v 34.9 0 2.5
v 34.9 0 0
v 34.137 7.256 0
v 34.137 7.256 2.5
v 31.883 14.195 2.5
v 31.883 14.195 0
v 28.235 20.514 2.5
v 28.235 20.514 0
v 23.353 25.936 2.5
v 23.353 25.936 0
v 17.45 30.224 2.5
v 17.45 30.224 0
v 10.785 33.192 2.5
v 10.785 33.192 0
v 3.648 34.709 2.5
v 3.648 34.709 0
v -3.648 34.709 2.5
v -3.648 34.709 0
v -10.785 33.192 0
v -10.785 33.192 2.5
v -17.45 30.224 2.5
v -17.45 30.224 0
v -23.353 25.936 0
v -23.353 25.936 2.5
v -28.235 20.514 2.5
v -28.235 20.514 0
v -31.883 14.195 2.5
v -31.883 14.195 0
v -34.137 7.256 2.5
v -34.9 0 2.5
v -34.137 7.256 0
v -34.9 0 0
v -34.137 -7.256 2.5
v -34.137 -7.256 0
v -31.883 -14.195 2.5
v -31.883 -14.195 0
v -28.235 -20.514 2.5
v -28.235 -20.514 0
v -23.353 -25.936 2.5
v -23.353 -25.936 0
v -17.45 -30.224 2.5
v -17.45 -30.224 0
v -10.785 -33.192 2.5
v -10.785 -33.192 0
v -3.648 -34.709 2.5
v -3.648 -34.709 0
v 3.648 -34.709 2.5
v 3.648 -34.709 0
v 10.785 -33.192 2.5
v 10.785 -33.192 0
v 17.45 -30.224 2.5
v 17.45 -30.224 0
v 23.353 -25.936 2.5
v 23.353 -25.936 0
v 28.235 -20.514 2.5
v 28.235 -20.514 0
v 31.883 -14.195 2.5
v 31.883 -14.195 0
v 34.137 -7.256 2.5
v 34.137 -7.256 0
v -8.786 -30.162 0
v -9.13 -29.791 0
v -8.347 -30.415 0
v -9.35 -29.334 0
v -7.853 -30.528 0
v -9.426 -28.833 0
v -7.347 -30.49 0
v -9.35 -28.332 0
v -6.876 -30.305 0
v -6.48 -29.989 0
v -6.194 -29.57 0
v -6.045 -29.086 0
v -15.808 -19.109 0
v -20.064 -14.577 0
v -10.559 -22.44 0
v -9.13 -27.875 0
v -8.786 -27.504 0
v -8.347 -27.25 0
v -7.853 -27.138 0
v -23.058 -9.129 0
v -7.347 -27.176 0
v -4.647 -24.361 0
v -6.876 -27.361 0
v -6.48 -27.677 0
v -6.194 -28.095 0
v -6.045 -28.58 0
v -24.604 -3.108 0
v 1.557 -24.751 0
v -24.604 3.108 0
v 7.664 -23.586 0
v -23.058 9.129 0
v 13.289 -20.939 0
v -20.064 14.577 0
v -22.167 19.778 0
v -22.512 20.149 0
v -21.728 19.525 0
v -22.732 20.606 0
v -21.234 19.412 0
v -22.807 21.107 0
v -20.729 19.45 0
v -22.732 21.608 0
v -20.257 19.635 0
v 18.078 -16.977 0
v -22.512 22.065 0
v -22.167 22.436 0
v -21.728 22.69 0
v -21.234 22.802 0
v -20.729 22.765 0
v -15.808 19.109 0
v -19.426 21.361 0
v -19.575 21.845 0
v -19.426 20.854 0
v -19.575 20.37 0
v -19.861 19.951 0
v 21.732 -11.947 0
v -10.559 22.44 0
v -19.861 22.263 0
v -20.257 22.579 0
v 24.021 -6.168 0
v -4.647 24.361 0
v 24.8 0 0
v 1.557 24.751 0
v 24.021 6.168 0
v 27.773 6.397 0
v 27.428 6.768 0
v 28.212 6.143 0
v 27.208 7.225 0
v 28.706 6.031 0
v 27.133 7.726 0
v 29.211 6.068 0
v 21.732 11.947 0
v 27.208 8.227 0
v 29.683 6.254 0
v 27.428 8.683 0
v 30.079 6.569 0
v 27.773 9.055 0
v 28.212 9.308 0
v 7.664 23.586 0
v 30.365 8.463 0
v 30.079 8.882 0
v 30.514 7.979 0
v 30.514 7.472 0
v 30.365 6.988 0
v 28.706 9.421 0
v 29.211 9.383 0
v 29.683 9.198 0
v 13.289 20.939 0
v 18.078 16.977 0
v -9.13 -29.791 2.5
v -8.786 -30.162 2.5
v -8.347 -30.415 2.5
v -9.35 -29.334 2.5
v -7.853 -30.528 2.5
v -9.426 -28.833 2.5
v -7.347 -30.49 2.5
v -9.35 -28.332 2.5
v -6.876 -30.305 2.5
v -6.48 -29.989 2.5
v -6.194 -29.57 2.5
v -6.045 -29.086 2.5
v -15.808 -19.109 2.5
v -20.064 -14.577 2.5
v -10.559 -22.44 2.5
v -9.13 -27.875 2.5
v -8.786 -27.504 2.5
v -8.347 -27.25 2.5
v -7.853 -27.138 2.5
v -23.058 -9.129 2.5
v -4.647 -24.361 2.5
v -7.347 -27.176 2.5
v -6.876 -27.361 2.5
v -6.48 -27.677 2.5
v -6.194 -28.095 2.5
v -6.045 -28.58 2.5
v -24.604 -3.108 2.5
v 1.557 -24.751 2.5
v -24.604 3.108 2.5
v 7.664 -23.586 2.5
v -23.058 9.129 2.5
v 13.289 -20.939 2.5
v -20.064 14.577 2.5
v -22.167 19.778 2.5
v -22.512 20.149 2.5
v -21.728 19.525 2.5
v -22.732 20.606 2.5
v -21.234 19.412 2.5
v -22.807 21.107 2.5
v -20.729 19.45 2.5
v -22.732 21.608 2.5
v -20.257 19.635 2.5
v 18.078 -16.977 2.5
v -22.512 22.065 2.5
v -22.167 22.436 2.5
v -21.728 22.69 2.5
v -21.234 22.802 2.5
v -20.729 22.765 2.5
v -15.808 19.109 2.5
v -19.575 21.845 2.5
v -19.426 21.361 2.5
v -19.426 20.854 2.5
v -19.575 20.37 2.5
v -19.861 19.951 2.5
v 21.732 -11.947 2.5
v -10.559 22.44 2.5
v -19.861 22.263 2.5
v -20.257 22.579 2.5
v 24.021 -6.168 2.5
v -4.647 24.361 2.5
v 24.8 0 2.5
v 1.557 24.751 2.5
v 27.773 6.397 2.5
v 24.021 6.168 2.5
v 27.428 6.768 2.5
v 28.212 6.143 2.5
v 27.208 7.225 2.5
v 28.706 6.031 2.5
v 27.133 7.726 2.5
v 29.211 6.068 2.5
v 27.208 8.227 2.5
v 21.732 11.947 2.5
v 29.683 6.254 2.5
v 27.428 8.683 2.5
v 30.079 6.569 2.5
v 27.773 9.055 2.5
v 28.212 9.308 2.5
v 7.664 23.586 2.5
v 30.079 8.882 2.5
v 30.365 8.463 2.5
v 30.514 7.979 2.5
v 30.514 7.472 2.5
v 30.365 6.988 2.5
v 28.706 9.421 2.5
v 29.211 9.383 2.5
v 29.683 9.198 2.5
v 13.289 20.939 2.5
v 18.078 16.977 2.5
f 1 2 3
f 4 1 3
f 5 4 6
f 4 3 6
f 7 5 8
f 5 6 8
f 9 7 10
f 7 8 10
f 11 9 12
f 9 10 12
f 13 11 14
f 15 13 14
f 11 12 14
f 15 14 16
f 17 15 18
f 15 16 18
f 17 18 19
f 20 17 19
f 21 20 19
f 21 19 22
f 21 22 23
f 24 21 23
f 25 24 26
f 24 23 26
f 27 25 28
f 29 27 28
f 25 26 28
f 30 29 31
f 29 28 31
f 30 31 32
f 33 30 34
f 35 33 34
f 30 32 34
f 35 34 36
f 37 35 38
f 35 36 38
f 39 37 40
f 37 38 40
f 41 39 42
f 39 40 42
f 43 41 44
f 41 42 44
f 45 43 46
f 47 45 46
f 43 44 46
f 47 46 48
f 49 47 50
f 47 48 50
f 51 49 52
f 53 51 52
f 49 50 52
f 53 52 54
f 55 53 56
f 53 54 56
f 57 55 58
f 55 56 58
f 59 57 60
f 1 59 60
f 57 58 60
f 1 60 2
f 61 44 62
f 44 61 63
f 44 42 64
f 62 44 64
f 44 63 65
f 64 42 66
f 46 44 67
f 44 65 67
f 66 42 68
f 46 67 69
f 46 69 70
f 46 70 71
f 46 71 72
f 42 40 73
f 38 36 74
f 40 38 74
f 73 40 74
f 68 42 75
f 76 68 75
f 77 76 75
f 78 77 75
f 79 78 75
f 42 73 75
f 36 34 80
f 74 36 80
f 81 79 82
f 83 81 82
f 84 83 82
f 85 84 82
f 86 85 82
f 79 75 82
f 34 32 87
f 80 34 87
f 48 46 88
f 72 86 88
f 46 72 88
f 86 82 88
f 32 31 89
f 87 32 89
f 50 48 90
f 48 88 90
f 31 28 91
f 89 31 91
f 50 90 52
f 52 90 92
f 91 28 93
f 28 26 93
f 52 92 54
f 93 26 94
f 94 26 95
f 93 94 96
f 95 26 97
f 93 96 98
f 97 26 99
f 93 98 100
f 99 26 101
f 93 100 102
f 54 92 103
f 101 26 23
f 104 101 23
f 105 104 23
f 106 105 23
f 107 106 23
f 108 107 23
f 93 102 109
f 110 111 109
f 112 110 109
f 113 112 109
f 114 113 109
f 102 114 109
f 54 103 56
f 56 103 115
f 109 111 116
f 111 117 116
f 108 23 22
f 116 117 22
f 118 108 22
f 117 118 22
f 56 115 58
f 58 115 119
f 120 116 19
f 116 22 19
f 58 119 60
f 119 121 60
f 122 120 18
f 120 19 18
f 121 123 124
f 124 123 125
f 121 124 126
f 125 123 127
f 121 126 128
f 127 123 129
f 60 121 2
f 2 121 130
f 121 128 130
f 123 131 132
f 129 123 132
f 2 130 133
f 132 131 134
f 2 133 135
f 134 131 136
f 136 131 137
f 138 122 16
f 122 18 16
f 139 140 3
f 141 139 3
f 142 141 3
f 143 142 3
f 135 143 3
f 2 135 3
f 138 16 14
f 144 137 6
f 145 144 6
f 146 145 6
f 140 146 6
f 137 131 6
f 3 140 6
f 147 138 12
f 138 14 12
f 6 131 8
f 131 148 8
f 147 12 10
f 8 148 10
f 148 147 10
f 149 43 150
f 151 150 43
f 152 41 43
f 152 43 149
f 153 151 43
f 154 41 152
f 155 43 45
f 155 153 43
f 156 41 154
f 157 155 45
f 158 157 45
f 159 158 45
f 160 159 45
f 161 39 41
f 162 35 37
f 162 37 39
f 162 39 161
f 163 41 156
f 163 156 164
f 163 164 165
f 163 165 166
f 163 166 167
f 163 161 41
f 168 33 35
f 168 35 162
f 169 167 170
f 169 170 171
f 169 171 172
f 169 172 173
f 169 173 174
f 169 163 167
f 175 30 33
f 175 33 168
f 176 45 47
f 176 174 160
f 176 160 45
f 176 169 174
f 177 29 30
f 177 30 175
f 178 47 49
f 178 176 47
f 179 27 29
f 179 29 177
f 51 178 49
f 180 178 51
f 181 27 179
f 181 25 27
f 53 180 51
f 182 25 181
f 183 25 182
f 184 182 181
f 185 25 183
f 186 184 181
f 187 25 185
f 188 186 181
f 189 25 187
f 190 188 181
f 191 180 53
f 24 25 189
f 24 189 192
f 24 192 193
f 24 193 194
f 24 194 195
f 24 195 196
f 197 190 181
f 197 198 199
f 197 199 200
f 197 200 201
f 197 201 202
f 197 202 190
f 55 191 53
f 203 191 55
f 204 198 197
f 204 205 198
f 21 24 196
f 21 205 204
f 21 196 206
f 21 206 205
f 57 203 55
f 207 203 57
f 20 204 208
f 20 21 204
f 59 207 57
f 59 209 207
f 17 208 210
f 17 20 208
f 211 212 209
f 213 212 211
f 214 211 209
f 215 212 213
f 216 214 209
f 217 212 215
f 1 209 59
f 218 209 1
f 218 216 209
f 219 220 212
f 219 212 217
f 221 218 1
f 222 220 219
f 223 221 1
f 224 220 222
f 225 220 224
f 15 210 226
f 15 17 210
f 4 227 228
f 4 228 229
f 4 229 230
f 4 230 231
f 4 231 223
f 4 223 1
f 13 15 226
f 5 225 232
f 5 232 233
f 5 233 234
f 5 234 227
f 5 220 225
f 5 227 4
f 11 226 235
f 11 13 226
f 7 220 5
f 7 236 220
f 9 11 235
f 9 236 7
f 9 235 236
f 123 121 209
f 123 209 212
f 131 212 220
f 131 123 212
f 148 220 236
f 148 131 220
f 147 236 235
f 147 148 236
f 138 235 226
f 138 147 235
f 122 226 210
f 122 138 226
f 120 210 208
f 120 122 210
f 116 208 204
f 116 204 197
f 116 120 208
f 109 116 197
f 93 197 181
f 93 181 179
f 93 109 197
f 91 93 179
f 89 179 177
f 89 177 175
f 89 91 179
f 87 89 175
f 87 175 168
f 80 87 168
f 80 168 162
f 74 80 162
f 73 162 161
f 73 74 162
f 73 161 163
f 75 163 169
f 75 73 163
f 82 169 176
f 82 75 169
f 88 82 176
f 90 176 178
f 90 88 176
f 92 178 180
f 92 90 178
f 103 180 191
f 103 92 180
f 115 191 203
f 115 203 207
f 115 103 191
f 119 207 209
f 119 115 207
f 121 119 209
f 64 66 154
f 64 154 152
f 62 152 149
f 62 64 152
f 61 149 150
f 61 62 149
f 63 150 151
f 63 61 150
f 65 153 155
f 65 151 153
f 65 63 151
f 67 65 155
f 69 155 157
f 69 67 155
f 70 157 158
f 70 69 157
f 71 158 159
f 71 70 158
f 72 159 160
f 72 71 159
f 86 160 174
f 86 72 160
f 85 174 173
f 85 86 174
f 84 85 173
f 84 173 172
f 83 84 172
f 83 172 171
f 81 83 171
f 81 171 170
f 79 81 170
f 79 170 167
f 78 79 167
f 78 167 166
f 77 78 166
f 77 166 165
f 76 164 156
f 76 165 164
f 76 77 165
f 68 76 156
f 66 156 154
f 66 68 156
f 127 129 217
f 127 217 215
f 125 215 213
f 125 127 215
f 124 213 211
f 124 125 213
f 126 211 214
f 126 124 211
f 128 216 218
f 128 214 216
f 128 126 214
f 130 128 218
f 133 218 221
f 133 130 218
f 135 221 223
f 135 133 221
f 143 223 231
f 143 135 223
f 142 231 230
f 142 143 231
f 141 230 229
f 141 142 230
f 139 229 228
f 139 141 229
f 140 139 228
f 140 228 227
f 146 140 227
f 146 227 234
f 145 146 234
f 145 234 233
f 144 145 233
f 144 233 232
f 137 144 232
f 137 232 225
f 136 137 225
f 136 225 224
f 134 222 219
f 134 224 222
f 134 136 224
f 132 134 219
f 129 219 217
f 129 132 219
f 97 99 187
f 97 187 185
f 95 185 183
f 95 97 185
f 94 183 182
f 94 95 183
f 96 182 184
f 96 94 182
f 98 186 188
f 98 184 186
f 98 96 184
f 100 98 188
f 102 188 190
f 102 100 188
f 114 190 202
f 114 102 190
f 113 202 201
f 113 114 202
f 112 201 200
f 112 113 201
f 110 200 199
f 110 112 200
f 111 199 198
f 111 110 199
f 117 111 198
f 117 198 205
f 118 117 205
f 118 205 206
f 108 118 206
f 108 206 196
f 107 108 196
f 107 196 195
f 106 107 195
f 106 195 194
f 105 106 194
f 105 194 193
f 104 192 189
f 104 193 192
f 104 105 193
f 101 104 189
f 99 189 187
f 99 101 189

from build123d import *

# Parameters (mm, degrees)
S01_TPU_BEAD_AND_BEARING_OUTER_RACE_KE_R       = 34.9
S01_TPU_BEAD_AND_BEARING_OUTER_RACE_KE_R_2     = 24.8
F_01_TPU_BEAD_AND_BEARING_OUTER_RACE_KEE_DEPTH = 2.5
F_02_START                                     = -0.1
S02_FLANGE_SCREW_CLEARANCE_R                   = 1.7
F_02_FLANGE_SCREW_CLEARANCE_DEPTH              = 2.7


with BuildPart() as part:
    # S01 - TPU bead and bearing outer-race keeper → 01 - TPU bead and bearing outer-race keeper (new body)
    with BuildSketch(Plane.XY):
        Circle(S01_TPU_BEAD_AND_BEARING_OUTER_RACE_KE_R)
        Circle(S01_TPU_BEAD_AND_BEARING_OUTER_RACE_KE_R_2, mode=Mode.SUBTRACT)
    extrude(amount=F_01_TPU_BEAD_AND_BEARING_OUTER_RACE_KEE_DEPTH)

    # S02 - Flange screw clearance → 02 - Flange screw clearance (cut)
    with BuildSketch(Plane.XY.offset(F_02_START)):
        with Locations(Location((28.832885915, 7.725748496, 0), (0, 0, 180))):
            Circle(S02_FLANGE_SCREW_CLEARANCE_R)
        with Locations(Location((-21.107137418, 21.107137418, 0), (0, 0, 180))):
            Circle(S02_FLANGE_SCREW_CLEARANCE_R)
        with Locations(Location((-7.725748496, -28.832885915, 0), (0, 0, 180))):
            Circle(S02_FLANGE_SCREW_CLEARANCE_R)
    extrude(amount=F_02_FLANGE_SCREW_CLEARANCE_DEPTH, mode=Mode.SUBTRACT)


solid = part.part
